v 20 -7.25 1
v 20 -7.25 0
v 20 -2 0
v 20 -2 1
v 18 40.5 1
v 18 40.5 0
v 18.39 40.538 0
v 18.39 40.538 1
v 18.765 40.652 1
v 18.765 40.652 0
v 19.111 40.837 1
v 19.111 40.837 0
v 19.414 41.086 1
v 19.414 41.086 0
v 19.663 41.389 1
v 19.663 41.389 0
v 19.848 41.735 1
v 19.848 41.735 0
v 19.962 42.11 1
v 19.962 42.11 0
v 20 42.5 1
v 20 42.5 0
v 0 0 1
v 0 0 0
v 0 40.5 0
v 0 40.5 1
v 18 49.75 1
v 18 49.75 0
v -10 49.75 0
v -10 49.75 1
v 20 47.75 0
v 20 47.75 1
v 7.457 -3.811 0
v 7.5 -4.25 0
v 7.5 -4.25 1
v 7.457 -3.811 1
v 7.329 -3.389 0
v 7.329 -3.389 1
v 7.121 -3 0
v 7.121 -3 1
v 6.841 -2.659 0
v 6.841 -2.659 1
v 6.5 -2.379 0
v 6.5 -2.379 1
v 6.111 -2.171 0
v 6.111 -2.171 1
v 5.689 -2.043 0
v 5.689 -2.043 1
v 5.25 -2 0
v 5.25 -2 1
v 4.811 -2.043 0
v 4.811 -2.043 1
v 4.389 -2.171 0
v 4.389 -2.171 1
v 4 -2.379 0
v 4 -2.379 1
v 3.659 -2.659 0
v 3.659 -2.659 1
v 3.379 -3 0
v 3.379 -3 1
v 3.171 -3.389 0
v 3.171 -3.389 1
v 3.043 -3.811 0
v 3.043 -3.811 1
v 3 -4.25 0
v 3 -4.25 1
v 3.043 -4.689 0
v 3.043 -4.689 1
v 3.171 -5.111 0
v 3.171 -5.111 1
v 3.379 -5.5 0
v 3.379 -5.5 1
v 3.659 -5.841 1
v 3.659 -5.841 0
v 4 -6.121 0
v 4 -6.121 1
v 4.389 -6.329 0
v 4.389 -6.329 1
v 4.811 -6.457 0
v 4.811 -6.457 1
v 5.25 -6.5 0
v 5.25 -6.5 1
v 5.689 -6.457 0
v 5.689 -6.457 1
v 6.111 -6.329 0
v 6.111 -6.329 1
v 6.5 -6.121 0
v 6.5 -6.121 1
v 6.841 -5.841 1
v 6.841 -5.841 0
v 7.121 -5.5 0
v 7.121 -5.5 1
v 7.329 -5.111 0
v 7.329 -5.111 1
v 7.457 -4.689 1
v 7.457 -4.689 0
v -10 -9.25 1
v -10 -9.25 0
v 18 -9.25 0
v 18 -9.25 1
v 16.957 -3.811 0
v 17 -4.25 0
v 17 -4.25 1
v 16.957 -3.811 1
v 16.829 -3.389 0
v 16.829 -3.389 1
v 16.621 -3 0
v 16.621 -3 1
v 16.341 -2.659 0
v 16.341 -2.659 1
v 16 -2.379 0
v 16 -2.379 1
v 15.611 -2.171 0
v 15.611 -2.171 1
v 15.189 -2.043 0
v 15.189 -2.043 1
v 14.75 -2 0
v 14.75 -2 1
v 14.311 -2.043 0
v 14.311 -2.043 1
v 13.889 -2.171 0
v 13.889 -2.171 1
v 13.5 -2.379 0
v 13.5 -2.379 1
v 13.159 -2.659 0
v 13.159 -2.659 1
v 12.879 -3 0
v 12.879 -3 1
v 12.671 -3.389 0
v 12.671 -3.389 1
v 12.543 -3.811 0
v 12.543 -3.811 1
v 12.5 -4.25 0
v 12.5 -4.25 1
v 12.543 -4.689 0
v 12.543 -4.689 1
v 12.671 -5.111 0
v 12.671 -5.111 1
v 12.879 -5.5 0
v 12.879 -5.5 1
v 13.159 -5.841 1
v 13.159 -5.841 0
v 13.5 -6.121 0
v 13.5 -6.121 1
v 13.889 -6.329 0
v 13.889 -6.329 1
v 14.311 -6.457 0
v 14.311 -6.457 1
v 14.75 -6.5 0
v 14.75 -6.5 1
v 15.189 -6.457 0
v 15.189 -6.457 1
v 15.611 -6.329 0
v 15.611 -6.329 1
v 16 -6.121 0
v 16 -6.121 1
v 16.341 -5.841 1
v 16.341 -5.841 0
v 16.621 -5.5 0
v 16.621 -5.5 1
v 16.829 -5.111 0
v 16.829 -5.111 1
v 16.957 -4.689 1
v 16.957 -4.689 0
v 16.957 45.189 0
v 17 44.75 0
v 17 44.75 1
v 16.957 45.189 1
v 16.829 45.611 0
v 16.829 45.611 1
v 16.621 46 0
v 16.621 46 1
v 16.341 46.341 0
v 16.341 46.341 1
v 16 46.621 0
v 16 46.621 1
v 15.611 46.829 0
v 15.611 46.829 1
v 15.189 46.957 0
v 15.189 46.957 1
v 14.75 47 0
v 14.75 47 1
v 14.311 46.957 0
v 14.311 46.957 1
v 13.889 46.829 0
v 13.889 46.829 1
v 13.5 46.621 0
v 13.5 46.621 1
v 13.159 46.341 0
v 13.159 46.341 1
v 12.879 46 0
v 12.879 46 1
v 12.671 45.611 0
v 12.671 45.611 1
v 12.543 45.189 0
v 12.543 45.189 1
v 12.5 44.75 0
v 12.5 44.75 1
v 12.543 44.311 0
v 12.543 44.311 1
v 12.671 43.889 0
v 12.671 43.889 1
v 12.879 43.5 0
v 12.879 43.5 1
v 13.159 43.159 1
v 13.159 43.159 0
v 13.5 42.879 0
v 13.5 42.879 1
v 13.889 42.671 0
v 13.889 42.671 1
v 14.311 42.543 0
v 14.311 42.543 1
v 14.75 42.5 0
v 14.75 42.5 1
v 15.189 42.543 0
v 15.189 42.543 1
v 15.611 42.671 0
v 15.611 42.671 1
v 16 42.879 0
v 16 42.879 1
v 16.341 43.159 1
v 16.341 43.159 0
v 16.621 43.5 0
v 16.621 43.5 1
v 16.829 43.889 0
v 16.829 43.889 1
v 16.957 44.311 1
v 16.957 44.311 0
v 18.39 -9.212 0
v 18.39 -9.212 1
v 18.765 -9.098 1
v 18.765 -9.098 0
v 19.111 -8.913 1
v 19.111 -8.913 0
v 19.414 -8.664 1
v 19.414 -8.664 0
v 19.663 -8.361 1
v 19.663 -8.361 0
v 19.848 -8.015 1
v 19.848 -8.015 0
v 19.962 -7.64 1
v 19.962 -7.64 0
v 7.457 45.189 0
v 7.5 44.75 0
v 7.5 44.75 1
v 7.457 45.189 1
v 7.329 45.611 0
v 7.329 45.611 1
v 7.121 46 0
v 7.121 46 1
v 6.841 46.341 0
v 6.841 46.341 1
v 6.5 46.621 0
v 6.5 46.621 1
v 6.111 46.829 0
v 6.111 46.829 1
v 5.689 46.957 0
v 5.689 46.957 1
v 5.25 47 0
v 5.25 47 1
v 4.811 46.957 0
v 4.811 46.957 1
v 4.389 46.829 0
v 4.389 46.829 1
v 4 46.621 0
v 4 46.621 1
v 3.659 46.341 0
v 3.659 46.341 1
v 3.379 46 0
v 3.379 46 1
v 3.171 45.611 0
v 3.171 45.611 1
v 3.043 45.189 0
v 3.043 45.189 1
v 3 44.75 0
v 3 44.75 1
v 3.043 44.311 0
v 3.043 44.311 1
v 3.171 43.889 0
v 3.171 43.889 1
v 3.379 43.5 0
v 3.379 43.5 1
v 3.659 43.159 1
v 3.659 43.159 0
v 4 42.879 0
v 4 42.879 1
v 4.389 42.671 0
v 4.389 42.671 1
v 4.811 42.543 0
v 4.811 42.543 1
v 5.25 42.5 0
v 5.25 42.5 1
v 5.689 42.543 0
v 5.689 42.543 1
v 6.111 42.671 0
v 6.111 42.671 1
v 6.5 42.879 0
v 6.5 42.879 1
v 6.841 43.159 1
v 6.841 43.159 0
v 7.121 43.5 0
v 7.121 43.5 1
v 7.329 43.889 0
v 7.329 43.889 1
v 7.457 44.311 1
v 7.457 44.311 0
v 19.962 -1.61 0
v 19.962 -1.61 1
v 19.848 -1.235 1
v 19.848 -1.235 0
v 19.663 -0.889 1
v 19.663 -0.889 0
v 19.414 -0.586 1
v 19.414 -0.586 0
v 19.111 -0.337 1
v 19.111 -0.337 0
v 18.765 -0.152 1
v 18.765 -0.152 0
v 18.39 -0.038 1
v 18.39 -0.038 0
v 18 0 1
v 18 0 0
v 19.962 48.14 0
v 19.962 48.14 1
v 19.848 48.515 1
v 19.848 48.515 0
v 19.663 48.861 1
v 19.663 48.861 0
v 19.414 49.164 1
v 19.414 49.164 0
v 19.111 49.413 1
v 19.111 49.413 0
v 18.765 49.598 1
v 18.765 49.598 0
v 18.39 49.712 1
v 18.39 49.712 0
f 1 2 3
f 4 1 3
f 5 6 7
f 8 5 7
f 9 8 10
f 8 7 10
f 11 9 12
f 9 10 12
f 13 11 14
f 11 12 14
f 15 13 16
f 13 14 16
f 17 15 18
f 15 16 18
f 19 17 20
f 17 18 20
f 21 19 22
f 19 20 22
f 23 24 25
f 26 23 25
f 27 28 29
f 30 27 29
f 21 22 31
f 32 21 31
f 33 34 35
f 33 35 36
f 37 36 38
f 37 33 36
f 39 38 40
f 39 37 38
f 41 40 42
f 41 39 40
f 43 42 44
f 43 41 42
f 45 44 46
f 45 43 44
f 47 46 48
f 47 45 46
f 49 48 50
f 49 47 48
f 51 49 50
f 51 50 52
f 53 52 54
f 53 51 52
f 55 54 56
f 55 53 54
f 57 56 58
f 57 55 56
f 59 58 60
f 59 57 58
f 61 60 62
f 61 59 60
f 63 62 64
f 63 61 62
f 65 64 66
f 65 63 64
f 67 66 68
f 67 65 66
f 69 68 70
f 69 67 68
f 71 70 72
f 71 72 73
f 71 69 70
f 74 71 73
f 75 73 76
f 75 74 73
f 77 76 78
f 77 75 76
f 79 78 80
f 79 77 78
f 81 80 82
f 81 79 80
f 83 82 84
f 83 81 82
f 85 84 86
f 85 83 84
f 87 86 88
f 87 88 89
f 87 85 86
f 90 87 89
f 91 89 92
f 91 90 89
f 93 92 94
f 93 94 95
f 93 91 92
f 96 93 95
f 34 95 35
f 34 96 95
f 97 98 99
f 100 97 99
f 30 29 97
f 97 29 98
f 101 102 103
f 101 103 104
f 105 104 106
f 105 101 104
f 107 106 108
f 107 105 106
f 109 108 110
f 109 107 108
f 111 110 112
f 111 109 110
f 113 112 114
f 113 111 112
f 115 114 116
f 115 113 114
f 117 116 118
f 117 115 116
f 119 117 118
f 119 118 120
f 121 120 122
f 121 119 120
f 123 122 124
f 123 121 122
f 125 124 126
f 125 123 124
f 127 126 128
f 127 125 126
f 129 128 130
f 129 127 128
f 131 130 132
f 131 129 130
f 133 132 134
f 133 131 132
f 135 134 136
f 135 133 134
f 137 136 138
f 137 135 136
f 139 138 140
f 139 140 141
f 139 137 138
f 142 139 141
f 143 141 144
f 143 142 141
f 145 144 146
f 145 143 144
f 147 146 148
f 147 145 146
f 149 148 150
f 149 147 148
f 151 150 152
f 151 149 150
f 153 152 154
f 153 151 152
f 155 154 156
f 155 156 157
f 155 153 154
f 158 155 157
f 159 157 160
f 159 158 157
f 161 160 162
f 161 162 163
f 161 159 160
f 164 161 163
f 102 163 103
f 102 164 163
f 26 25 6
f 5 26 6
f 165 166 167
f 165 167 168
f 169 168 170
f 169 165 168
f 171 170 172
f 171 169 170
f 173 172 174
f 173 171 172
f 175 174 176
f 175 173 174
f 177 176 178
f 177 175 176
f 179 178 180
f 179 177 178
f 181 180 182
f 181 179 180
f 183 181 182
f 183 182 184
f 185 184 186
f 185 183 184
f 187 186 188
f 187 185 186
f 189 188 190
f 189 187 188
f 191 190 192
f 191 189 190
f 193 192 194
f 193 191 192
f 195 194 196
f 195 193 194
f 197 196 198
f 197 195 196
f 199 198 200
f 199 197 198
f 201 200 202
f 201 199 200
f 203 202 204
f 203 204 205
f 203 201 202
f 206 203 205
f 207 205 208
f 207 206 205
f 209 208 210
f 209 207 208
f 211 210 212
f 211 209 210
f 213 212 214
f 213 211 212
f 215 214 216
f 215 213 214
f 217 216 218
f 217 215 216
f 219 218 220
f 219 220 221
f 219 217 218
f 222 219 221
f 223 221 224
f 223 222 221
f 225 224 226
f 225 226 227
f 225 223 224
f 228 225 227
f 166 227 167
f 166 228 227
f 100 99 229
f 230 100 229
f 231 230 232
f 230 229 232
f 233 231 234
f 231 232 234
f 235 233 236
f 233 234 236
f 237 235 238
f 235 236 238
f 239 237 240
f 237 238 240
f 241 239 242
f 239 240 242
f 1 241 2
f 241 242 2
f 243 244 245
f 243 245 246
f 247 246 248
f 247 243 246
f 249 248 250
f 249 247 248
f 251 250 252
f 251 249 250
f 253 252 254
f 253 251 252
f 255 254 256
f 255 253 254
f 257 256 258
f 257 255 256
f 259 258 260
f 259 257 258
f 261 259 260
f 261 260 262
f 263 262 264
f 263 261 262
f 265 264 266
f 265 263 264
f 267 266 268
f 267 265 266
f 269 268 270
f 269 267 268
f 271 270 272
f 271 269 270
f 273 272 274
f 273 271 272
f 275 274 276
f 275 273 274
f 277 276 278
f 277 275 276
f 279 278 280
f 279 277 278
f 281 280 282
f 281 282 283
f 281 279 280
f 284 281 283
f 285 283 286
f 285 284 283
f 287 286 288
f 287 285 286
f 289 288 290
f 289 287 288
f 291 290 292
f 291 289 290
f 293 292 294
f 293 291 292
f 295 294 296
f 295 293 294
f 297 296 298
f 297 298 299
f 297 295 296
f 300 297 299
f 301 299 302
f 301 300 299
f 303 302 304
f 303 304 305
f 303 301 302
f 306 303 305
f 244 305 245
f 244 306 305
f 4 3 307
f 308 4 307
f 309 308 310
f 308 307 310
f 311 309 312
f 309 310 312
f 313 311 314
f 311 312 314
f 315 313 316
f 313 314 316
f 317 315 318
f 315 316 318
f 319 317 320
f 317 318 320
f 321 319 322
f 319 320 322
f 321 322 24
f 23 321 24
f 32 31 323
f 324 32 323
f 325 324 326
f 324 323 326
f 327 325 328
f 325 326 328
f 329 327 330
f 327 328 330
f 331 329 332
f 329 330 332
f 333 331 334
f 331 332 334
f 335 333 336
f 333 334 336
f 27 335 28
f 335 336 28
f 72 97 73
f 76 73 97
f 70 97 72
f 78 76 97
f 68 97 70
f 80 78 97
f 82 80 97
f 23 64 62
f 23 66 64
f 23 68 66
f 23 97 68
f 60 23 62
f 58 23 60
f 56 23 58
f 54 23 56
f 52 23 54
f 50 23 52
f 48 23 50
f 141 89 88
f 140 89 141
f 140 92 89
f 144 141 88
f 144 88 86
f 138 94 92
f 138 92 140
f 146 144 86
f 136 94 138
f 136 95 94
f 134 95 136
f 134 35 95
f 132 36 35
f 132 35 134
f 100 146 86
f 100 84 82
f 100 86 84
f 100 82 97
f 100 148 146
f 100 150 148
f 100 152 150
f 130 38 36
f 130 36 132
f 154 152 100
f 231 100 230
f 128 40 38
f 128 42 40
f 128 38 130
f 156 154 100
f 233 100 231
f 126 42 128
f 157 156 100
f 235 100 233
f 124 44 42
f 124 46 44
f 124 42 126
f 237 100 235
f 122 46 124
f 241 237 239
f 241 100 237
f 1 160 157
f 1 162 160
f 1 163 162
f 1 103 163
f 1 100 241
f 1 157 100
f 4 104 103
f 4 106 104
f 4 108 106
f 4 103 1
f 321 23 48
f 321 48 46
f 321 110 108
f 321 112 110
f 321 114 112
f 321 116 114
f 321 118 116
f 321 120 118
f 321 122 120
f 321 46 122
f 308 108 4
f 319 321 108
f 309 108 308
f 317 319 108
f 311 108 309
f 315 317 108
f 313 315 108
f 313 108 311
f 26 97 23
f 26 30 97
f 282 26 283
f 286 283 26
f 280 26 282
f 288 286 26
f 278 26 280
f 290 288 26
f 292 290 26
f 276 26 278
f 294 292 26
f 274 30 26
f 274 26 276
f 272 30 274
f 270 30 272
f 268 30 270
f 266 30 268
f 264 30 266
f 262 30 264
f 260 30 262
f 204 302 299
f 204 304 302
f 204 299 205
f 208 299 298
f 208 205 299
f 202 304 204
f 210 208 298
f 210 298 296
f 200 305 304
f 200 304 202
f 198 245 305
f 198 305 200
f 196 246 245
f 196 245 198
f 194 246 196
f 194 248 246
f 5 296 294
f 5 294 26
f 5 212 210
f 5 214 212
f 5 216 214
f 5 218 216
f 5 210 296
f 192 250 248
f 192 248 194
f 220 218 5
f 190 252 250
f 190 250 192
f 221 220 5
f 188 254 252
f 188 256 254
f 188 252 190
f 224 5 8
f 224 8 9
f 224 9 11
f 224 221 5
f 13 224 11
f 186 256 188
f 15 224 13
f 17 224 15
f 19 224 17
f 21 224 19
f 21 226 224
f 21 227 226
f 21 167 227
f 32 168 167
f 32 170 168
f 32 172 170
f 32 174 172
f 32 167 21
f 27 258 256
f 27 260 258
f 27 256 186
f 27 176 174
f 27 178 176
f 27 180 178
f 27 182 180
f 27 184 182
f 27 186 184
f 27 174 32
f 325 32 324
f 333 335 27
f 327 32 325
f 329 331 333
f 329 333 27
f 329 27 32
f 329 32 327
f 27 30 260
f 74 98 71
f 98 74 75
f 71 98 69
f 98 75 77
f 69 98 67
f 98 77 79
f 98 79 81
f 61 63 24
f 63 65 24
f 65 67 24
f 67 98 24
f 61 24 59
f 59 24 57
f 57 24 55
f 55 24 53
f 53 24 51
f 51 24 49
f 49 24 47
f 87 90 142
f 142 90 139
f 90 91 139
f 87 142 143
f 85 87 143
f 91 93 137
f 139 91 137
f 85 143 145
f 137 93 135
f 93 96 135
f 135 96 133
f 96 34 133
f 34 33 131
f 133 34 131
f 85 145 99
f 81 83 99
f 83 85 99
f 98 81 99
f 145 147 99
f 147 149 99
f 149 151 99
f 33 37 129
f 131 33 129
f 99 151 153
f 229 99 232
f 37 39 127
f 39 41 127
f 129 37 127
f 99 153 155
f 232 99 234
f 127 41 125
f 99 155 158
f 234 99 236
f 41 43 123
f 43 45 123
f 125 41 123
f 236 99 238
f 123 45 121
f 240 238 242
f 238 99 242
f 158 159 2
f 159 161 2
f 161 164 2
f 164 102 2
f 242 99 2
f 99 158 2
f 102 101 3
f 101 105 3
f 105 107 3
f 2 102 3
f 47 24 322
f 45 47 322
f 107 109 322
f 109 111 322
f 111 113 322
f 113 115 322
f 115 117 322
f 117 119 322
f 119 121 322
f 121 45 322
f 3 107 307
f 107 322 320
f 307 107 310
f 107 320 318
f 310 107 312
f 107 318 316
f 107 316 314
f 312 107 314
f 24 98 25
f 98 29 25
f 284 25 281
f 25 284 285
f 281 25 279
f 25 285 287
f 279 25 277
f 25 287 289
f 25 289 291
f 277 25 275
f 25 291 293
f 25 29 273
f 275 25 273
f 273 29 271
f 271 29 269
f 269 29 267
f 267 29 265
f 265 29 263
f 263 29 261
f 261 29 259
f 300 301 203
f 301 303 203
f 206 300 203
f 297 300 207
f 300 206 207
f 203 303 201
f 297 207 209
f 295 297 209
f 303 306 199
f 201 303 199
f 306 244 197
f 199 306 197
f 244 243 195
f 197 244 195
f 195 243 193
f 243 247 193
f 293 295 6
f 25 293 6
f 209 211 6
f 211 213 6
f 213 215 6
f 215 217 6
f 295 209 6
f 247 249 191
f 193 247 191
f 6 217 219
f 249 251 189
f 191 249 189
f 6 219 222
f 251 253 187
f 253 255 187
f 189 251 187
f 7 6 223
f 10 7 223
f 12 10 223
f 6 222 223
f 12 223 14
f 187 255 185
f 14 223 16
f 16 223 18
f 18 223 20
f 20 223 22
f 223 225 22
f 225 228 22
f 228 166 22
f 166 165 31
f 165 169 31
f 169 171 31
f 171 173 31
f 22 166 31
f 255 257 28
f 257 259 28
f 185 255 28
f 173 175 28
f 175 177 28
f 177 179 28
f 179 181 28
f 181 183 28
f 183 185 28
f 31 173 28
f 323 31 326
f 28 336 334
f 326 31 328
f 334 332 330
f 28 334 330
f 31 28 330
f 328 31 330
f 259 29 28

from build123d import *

# Parameters (mm, degrees)
SKETCH1_R           = 2.25
BOSS_EXTRUDE1_DEPTH = 1


with BuildPart() as part:
    # Sketch1 → Boss-Extrude1 (new body)
    with BuildSketch(Plane.XY):
        with BuildLine():
            Line((20, 42.5), (20, 47.75))
            ThreePointArc((20, 47.75), (19.414213562, 49.164213562), (18, 49.75))
            Line((18, 49.75), (-10, 49.75))
            Line((-10, 49.75), (-10, -9.25))
            Line((-10, -9.25), (18, -9.25))
            ThreePointArc((18, -9.25), (19.414213562, -8.664213562), (20, -7.25))
            Line((20, -7.25), (20, -2))
            ThreePointArc((20, -2), (19.414213562, -0.585786438), (18, 0))
            Line((18, 0), (0, 0))
            Line((0, 0), (0, 40.5))
            Line((0, 40.5), (18, 40.5))
            ThreePointArc((18, 40.5), (19.414213562, 41.085786438), (20, 42.5))
        make_face()
        with Locations((5.25, 44.75)):
            Circle(SKETCH1_R, mode=Mode.SUBTRACT)
        with Locations((14.75, 44.75)):
            Circle(SKETCH1_R, mode=Mode.SUBTRACT)
        with Locations((14.75, -4.25)):
            Circle(SKETCH1_R, mode=Mode.SUBTRACT)
        with Locations((5.25, -4.25)):
            Circle(SKETCH1_R, mode=Mode.SUBTRACT)
    extrude(amount=BOSS_EXTRUDE1_DEPTH)


solid = part.part
